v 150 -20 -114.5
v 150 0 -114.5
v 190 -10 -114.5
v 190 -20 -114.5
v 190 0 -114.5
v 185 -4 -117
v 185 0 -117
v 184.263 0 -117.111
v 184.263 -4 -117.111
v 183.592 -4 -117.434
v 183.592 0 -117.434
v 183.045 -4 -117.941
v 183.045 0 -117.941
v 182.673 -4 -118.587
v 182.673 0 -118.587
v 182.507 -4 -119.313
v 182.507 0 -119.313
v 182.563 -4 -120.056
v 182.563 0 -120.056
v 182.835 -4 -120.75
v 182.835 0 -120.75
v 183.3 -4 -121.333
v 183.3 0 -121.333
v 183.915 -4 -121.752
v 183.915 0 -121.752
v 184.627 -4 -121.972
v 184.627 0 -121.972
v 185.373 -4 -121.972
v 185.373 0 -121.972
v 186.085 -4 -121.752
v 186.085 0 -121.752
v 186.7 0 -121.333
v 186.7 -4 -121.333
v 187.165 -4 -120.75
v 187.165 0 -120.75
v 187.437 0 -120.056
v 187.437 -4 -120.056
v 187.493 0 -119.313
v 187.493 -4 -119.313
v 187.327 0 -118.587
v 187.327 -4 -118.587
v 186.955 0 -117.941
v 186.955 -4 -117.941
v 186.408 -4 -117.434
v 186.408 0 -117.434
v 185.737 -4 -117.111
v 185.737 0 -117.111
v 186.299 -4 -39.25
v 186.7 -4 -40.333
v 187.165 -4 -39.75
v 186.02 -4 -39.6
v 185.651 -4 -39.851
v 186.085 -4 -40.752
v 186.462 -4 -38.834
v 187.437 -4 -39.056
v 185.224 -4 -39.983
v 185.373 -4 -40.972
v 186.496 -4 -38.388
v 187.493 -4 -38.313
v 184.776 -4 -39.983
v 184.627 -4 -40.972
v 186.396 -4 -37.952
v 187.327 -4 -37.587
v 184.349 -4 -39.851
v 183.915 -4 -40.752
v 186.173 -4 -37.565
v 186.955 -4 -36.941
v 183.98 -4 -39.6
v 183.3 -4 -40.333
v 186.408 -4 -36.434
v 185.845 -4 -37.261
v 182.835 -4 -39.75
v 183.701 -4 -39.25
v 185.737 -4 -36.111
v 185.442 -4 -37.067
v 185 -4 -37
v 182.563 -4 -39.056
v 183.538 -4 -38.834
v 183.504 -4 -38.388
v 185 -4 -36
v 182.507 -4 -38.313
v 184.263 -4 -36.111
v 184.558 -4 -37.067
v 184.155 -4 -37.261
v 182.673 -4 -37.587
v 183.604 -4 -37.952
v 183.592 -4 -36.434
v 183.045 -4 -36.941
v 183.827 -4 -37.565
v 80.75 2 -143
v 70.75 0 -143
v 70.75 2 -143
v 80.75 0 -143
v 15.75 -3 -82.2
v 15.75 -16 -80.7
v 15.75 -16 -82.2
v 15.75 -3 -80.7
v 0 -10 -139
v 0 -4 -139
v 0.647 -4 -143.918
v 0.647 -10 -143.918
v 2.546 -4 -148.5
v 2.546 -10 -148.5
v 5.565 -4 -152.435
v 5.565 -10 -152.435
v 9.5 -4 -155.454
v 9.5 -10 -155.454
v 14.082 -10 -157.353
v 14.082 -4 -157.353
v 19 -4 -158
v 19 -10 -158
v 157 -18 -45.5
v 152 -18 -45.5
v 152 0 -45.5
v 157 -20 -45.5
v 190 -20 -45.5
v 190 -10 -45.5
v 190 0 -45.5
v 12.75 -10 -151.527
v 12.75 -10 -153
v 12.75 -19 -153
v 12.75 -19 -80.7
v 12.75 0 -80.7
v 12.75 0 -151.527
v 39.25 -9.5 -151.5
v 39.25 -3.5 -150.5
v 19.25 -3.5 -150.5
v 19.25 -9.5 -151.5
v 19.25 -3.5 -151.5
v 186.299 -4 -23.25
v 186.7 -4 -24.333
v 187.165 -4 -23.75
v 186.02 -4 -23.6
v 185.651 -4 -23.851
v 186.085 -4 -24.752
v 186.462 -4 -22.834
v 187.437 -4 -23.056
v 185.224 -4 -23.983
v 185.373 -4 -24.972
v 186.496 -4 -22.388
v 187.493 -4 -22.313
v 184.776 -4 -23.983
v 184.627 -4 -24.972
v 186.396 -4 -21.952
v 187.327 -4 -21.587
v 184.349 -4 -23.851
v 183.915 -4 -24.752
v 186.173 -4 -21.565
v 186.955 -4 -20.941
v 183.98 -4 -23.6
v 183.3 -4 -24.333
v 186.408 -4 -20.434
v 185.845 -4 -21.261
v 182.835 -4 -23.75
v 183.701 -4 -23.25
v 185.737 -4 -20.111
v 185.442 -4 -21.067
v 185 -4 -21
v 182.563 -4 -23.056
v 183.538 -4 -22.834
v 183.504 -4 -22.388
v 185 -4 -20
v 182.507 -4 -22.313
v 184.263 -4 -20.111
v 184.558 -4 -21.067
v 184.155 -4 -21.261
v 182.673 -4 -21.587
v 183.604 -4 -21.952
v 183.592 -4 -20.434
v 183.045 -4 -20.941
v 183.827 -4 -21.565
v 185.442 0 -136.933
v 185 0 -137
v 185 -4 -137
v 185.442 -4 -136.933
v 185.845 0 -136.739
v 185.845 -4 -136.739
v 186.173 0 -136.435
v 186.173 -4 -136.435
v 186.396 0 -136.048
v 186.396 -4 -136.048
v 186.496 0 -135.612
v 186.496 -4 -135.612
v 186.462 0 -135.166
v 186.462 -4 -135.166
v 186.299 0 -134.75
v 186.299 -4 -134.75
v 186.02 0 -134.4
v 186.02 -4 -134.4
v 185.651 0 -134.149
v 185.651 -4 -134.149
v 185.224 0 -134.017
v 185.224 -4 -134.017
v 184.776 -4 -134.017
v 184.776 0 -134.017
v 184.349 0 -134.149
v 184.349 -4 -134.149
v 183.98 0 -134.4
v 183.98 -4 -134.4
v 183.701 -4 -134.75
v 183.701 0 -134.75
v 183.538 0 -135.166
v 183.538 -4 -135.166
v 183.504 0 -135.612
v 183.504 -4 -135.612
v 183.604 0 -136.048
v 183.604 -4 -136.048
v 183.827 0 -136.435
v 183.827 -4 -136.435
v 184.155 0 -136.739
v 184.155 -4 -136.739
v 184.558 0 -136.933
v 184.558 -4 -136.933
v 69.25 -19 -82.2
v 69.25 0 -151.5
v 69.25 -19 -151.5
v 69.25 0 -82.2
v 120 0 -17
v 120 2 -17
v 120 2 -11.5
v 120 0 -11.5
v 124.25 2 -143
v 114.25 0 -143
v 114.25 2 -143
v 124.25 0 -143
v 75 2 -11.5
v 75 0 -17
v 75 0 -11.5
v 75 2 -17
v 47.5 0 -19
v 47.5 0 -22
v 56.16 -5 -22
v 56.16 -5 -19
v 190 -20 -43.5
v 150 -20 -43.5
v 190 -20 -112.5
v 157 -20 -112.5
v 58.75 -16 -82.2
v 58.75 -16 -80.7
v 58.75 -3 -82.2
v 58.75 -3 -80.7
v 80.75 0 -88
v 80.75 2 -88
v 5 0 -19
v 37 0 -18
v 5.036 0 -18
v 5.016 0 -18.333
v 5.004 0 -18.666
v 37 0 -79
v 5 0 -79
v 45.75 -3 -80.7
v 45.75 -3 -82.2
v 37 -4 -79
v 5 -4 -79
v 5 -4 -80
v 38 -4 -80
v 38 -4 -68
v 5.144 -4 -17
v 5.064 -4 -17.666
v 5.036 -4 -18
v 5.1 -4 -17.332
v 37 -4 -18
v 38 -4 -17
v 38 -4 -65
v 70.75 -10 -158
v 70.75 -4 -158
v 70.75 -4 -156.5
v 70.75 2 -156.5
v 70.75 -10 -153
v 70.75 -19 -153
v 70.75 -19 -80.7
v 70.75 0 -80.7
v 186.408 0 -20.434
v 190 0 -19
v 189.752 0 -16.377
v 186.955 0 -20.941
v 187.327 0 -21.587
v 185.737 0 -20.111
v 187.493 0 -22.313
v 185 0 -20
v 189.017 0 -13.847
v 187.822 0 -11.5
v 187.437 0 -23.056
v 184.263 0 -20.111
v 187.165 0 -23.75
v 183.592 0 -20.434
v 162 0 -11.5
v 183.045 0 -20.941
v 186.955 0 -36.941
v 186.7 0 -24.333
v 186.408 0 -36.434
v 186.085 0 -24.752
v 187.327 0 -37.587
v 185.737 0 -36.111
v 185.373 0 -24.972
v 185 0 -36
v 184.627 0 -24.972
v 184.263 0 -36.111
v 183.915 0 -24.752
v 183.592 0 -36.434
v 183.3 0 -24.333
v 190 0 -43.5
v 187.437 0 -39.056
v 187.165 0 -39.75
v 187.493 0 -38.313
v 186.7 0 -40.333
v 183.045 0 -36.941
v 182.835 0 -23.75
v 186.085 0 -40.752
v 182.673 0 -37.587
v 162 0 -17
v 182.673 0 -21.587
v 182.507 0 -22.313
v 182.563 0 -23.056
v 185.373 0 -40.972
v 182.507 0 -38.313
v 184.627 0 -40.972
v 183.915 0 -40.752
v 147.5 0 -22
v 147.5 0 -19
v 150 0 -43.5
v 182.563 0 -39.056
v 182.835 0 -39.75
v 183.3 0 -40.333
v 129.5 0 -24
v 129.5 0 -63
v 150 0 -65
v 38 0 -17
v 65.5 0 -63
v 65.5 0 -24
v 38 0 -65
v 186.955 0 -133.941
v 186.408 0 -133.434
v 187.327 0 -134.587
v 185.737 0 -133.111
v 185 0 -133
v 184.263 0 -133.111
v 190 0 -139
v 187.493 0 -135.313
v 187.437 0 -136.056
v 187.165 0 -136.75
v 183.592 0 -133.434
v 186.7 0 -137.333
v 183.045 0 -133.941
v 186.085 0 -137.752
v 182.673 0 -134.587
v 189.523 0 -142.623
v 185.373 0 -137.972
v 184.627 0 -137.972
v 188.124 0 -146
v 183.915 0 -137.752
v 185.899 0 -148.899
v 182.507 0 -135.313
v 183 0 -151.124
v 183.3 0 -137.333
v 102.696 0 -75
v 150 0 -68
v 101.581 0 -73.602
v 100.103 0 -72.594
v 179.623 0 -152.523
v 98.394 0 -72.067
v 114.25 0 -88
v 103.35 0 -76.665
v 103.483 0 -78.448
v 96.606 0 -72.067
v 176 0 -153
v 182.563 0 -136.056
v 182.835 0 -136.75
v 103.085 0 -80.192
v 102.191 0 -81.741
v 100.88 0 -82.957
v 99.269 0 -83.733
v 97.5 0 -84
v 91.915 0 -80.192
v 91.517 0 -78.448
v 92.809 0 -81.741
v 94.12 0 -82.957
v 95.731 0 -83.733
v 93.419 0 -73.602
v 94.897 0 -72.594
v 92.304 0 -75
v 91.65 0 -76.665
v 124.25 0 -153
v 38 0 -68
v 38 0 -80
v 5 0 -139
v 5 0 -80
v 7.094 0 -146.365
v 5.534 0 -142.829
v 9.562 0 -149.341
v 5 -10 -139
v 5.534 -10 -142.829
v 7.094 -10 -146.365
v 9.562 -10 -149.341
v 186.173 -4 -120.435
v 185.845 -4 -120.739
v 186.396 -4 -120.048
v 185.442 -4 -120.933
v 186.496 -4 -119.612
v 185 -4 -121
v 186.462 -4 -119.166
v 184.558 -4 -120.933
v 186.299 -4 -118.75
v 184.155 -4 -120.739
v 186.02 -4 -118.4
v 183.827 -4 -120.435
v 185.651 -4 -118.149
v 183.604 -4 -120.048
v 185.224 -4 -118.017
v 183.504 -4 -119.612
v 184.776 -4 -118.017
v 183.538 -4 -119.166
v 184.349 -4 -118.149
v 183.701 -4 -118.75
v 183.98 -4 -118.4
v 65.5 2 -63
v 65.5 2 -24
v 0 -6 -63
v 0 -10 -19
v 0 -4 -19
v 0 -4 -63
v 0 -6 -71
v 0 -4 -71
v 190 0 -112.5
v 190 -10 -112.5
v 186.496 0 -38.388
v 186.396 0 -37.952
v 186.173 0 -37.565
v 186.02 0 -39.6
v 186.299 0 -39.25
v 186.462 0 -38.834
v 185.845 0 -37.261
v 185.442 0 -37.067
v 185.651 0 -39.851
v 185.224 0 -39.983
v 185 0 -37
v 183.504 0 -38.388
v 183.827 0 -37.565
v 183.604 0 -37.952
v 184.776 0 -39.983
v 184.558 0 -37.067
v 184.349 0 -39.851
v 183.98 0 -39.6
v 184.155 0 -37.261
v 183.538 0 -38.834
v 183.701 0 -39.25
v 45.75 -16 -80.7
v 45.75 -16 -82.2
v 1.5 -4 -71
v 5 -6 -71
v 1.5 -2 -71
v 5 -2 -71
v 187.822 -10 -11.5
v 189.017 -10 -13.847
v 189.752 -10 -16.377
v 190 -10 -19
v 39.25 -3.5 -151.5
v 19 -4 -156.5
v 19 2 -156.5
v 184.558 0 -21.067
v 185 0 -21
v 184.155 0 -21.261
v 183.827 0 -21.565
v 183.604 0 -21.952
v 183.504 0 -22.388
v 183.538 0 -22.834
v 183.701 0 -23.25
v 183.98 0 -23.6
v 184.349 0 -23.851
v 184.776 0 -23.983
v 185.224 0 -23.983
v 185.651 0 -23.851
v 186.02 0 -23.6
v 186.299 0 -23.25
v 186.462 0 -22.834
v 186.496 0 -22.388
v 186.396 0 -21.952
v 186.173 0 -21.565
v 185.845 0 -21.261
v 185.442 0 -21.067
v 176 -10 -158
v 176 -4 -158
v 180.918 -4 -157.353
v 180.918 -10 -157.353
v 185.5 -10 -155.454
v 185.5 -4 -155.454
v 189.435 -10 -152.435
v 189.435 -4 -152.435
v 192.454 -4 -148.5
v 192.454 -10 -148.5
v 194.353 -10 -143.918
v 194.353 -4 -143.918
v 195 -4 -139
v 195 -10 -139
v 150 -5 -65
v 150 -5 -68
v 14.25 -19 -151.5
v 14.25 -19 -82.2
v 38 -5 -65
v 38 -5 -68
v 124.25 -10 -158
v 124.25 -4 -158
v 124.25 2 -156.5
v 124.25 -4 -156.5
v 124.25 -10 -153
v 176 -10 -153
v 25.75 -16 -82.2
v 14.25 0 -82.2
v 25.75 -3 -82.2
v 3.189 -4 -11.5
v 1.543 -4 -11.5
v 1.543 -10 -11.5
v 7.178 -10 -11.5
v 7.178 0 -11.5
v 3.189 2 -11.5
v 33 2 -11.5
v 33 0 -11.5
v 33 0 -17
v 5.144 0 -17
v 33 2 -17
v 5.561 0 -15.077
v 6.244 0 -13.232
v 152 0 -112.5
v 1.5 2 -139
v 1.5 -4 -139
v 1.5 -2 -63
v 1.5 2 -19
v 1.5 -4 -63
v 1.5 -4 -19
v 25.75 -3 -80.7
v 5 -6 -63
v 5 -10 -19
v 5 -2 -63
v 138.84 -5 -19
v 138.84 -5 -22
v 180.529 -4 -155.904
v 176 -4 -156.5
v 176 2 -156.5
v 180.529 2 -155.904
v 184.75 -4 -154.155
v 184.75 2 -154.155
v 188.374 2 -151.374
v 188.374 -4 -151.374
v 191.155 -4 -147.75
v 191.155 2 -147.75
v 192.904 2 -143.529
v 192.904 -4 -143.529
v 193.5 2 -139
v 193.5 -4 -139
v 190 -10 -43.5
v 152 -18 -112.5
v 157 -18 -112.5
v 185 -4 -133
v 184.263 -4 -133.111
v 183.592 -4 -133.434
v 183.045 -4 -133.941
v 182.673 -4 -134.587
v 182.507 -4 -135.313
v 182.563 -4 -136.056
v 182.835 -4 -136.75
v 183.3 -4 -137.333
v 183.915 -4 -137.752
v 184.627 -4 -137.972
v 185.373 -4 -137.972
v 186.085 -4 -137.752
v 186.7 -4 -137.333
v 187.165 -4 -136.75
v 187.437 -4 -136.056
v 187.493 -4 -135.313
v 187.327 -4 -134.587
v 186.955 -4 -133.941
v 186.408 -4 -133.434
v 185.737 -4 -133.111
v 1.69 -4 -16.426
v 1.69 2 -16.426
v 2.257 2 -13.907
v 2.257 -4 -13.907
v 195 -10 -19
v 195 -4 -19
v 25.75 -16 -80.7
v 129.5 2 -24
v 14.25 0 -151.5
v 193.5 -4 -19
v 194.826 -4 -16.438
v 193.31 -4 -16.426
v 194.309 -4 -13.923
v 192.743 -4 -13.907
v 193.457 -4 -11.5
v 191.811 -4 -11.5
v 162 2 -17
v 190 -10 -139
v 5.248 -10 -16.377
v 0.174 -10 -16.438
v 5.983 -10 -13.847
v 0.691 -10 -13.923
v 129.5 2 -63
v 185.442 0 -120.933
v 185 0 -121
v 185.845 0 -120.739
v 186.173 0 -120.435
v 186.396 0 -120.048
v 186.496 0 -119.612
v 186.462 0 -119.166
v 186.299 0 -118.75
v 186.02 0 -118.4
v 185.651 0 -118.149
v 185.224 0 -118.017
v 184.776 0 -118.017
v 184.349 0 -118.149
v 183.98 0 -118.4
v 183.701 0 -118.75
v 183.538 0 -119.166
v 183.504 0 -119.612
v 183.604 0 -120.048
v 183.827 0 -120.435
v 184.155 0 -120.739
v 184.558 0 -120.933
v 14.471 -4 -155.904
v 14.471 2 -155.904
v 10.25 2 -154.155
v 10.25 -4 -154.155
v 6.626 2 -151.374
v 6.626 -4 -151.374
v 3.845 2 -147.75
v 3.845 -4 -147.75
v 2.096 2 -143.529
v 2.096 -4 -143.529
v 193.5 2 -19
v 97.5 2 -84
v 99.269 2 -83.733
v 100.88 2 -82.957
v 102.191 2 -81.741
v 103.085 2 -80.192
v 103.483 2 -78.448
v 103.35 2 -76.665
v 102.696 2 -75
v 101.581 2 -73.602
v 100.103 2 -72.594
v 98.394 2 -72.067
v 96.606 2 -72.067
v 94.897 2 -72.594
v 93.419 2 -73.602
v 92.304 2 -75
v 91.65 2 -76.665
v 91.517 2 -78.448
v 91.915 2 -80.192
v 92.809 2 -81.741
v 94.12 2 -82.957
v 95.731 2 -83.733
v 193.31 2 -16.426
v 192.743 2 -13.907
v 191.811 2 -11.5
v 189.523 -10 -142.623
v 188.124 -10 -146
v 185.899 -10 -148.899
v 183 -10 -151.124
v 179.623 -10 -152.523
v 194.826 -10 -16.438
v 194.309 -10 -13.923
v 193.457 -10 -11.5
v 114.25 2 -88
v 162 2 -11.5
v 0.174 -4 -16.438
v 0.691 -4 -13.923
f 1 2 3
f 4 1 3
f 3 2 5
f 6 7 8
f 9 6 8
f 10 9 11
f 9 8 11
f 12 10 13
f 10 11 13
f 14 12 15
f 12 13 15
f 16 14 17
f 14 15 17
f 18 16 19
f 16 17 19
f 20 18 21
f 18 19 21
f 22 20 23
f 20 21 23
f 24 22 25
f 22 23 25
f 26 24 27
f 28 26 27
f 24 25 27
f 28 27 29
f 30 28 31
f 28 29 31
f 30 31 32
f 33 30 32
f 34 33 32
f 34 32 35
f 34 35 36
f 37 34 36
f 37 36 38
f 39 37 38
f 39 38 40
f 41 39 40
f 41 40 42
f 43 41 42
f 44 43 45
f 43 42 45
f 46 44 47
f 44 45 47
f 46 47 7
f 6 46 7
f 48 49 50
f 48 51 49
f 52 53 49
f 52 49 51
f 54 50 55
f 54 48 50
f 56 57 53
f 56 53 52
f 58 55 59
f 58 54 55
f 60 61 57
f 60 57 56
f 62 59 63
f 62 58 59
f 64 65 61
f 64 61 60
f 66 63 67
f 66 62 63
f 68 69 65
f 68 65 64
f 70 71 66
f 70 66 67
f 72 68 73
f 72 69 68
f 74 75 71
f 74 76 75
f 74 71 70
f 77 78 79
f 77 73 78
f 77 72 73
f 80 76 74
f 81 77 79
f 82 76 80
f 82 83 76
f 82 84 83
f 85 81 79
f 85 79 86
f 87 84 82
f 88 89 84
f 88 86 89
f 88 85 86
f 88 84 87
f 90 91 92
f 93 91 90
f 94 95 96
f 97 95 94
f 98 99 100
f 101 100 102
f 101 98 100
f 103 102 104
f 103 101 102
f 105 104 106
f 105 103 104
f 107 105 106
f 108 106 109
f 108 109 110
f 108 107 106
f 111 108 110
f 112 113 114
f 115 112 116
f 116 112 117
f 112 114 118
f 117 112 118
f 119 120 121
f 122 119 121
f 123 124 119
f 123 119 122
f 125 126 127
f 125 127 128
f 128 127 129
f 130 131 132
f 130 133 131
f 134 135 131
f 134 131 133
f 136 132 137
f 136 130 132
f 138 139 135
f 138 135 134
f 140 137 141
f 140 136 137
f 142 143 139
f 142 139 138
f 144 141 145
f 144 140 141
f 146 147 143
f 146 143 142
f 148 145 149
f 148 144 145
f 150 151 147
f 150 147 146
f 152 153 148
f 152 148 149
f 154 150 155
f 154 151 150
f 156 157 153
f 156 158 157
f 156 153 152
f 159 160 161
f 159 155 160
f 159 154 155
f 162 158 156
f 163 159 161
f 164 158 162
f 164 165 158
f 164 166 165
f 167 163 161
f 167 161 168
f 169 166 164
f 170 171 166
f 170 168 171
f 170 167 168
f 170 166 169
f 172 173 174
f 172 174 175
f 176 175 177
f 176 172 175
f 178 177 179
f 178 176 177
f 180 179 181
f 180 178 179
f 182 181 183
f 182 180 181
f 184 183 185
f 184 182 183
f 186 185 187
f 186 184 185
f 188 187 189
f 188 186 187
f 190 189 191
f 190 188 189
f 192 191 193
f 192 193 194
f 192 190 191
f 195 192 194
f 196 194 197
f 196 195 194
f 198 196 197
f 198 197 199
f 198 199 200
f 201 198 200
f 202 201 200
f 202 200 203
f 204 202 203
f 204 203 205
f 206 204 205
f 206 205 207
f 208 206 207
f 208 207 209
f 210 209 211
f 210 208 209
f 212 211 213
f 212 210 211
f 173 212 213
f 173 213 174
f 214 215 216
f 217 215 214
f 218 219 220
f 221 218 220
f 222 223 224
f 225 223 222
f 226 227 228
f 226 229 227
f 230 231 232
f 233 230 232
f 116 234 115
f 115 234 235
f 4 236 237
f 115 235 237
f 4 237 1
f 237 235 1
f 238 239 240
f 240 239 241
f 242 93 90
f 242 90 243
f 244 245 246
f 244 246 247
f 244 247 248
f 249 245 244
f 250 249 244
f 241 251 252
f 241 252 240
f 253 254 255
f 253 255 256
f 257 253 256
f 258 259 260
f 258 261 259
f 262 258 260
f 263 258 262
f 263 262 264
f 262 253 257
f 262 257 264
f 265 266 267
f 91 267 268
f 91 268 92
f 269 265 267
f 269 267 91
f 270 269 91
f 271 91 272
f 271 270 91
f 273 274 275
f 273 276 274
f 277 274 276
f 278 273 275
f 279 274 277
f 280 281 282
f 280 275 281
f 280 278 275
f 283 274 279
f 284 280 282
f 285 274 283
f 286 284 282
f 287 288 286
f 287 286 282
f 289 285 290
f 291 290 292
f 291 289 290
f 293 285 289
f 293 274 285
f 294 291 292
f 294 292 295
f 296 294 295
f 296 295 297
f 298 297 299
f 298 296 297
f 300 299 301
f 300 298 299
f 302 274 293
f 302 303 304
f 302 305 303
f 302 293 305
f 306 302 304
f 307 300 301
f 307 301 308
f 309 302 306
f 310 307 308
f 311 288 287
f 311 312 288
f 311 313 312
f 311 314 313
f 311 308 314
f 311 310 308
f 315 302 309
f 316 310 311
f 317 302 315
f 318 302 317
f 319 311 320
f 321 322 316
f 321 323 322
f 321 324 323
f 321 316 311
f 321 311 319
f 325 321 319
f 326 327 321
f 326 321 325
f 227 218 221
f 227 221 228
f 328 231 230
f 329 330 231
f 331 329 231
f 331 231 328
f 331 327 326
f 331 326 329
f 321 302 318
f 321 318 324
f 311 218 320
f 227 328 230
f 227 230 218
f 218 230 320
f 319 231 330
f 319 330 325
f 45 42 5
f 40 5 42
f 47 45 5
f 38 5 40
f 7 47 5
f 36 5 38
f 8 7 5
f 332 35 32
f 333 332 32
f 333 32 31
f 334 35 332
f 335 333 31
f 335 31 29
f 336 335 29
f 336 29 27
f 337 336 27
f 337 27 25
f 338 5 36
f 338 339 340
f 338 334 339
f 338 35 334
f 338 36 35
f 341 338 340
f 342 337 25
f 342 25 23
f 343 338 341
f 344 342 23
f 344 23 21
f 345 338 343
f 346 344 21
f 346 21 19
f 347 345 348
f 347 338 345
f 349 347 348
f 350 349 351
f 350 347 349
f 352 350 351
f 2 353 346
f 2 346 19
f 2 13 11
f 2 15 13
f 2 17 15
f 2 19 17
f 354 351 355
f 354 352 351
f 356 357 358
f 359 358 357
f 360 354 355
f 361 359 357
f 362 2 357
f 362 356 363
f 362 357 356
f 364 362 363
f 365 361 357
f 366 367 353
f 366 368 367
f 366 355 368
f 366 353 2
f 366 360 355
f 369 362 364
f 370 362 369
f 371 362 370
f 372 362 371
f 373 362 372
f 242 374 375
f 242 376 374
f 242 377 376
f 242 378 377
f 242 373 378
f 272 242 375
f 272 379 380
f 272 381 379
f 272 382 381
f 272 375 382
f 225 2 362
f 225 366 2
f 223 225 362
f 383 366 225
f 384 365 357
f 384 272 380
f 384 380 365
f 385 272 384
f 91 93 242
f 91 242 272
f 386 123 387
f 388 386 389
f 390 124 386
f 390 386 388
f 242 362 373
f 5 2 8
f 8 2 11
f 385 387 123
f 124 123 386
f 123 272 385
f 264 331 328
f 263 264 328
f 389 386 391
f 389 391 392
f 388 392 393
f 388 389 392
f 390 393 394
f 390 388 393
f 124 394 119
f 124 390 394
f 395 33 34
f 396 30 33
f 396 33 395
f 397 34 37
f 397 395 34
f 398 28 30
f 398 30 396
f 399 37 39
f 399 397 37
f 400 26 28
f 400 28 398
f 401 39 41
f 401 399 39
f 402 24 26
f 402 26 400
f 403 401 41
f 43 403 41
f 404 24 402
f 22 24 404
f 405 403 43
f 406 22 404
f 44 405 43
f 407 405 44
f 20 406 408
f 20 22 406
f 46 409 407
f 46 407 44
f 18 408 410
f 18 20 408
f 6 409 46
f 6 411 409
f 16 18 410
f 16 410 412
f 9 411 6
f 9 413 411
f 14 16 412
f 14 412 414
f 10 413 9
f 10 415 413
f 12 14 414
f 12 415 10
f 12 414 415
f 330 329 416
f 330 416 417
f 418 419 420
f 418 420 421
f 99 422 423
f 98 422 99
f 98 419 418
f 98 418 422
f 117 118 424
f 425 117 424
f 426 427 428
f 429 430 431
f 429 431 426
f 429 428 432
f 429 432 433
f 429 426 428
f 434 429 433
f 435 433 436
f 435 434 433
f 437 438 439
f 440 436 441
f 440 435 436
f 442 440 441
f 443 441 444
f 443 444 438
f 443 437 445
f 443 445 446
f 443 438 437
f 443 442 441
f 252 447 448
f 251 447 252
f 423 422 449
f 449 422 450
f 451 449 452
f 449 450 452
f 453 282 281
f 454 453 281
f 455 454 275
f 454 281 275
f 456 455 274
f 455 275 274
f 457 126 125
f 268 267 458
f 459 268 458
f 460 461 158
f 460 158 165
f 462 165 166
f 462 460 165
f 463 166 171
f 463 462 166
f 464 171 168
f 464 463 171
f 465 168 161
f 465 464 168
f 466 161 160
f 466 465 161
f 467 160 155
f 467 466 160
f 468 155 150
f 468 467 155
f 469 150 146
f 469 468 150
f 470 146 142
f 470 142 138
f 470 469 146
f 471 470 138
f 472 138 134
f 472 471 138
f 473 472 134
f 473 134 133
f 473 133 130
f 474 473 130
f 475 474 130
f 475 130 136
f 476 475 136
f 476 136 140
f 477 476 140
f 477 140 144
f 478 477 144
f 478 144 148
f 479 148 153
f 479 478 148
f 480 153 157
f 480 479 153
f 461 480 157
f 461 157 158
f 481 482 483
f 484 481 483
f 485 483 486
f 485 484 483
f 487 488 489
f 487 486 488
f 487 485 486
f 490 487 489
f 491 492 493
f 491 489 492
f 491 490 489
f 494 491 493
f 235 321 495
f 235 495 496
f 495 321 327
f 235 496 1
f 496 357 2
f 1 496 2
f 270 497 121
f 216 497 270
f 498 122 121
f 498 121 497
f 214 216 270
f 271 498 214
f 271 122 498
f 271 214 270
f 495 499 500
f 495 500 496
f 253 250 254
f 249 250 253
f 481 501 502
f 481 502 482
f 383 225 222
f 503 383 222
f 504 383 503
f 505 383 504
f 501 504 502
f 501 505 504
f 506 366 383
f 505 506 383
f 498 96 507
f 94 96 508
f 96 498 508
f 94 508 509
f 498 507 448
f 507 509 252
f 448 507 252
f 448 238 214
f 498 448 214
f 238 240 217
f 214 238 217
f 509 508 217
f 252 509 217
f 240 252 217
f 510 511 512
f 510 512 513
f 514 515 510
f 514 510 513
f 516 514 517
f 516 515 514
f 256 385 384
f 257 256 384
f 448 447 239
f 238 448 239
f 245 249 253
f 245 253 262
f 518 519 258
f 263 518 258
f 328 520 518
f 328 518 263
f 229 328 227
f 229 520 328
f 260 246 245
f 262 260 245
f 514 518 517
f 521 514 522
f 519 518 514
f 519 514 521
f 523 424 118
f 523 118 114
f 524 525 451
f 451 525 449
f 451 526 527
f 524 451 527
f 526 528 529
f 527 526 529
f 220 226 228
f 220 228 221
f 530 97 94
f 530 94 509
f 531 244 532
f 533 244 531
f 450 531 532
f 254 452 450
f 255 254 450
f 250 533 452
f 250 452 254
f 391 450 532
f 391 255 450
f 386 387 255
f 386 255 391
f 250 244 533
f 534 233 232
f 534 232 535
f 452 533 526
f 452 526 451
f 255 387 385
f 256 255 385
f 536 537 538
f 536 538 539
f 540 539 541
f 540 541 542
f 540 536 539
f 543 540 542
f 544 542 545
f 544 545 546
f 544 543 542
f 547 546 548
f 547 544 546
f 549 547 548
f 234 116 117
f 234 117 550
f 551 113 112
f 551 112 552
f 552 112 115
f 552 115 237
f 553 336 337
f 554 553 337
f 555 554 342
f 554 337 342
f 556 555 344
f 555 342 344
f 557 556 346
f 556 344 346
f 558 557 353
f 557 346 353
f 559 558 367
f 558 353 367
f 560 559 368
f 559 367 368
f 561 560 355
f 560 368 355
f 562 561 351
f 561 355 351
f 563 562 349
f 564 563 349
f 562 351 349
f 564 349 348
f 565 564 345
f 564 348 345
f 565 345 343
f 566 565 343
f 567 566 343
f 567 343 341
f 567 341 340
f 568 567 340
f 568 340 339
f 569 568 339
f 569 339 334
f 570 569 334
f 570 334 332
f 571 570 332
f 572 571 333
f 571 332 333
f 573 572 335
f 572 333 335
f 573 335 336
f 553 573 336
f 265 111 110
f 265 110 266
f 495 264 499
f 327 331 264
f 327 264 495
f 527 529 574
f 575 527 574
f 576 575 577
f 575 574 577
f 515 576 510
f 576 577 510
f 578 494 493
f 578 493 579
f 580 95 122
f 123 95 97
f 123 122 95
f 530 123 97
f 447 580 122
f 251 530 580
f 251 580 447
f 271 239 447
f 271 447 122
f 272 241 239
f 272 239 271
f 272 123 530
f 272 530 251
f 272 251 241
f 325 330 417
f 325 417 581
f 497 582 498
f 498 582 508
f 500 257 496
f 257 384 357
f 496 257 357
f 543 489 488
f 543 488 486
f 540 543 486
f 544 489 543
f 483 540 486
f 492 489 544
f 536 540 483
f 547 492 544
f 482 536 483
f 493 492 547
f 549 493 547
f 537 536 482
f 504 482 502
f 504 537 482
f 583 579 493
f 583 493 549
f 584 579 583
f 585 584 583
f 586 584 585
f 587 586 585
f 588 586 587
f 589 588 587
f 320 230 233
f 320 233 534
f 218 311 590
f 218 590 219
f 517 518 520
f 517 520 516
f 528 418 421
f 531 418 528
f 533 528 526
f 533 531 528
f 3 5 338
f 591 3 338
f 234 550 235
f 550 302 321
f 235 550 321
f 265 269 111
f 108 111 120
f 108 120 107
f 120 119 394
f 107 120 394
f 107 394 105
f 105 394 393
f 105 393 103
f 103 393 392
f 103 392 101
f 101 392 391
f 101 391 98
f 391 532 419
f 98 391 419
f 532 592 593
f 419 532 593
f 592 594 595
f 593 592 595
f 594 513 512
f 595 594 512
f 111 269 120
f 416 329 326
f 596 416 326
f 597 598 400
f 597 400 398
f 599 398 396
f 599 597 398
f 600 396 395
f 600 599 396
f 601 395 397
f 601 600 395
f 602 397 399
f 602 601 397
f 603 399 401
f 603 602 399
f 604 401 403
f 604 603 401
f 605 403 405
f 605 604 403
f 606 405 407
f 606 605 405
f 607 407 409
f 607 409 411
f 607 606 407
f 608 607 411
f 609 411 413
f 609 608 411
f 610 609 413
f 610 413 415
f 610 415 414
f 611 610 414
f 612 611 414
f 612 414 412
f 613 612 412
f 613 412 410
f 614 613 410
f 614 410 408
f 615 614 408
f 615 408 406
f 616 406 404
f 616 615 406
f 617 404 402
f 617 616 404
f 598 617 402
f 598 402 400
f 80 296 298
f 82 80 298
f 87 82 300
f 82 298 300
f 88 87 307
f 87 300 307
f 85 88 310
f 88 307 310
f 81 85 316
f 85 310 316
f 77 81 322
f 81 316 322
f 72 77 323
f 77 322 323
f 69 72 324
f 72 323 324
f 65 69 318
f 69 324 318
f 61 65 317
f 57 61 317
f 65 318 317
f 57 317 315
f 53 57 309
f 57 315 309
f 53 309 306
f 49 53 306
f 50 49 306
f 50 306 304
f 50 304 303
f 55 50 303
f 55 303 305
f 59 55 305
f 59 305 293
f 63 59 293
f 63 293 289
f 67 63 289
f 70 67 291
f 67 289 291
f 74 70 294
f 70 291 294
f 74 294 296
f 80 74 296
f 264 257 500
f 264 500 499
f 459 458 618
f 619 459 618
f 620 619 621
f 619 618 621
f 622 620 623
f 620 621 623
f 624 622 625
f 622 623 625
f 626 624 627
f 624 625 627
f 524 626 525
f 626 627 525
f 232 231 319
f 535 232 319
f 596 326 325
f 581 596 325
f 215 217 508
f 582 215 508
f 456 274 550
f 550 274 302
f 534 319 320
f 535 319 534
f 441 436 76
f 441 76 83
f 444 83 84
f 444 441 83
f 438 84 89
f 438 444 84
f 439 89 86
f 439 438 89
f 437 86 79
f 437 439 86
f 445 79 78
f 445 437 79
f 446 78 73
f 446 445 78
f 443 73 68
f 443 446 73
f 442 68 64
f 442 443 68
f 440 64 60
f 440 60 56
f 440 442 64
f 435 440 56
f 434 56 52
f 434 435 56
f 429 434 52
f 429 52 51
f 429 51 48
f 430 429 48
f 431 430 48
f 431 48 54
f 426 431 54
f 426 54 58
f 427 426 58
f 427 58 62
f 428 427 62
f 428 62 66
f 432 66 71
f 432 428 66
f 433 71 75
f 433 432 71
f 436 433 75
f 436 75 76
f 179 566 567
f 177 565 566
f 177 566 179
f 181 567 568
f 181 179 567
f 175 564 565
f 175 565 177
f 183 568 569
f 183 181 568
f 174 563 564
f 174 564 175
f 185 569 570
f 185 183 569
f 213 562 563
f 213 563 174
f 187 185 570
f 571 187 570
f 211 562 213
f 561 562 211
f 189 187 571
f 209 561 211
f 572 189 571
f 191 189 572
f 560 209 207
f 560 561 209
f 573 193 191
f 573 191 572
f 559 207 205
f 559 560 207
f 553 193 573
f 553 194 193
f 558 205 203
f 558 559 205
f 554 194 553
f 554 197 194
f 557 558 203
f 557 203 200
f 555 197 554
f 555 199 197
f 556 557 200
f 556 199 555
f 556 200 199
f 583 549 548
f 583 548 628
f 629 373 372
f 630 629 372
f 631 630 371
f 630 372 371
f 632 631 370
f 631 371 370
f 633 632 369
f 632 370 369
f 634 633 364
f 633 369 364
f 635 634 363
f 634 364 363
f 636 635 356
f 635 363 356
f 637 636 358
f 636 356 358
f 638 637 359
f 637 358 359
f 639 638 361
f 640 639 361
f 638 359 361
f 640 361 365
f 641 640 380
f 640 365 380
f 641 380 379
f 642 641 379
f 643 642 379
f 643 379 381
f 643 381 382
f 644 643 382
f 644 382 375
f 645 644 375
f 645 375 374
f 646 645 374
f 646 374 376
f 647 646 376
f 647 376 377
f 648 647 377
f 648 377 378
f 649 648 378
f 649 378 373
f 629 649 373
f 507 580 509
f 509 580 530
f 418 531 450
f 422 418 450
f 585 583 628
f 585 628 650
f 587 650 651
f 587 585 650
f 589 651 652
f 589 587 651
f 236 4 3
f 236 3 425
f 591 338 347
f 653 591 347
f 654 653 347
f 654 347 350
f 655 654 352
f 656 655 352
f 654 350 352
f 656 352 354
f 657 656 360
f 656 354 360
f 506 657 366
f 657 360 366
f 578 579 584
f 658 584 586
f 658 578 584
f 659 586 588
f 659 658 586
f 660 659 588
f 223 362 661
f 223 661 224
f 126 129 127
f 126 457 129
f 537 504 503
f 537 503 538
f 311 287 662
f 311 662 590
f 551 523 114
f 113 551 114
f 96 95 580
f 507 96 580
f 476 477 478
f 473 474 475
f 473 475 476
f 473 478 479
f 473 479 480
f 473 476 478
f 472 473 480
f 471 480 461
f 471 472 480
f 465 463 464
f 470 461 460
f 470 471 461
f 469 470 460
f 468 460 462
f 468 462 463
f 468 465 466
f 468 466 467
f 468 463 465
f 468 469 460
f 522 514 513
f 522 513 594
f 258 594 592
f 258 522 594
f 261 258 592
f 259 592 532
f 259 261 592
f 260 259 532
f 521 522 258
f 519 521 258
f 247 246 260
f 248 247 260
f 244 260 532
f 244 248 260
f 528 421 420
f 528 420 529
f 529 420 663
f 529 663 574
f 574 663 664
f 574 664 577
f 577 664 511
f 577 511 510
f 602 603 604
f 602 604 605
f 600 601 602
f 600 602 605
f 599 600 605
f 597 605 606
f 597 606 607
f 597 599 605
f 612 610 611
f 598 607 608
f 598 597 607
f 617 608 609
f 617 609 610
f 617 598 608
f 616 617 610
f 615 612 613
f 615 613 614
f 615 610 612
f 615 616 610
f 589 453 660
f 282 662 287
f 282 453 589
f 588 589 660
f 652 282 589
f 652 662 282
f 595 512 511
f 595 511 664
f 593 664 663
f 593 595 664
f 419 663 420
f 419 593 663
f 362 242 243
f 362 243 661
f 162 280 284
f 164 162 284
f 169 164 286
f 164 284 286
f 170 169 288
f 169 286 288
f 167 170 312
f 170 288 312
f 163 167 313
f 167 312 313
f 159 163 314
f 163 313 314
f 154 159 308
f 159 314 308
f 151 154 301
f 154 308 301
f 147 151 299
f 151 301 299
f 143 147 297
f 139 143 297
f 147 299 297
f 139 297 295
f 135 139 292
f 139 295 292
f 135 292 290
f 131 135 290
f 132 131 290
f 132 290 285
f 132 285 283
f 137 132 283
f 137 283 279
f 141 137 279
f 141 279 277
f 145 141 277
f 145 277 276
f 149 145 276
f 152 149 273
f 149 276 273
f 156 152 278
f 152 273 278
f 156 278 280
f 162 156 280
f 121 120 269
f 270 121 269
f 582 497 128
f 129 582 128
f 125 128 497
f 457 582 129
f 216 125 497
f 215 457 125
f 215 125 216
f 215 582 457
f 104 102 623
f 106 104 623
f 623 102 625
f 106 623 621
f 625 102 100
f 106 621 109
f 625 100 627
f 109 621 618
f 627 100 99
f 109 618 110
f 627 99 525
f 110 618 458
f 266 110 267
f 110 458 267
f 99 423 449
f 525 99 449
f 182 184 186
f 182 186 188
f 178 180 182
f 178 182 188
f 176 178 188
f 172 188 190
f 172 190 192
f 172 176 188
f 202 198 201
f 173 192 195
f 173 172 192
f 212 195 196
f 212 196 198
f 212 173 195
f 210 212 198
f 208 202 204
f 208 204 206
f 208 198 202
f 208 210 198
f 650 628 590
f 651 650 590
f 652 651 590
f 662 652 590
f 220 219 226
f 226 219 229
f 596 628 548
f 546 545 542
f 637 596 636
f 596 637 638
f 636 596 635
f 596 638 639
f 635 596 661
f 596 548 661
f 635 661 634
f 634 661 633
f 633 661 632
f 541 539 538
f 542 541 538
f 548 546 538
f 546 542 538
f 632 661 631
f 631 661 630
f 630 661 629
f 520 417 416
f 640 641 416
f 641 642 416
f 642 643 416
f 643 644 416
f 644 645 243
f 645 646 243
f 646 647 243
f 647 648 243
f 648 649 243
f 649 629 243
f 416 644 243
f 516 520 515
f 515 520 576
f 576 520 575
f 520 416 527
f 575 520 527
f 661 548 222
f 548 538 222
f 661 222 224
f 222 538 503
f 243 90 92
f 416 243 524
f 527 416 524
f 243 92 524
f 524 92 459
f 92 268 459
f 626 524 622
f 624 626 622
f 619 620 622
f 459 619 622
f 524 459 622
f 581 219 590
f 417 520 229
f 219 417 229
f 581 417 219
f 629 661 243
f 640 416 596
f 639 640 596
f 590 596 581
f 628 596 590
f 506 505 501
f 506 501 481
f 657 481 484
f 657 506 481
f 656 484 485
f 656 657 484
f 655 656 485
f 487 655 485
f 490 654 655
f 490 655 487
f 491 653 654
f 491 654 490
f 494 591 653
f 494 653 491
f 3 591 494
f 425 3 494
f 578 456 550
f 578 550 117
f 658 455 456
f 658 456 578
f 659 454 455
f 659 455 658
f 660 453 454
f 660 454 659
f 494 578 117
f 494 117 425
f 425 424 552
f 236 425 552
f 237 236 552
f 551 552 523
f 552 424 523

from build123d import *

# Parameters (mm, degrees)
BOSS_EXTRUDE1_DEPTH     = 2
SKETCH2_W               = 45
SKETCH2_H               = 5
BOSS_EXTRUDE2_DEPTH     = 10
BOSS_EXTRUDE3_DEPTH     = 20
SKETCH4_W               = 67
SKETCH4_H               = 2
BOSS_EXTRUDE4_DEPTH     = 5
SKETCH5_W               = 58
SKETCH5_H               = 72.3
SKETCH5_W_2             = 55
SKETCH5_H_2             = 69.3
BOSS_EXTRUDE5_DEPTH     = 19
SKETCH6_W               = 13
SKETCH6_H               = 13
SKETCH6_W_2             = 10
CUT_EXTRUDE1_DEPTH      = 1.5
BOSS_EXTRUDE6_DEPTH     = 10
CUT_EXTRUDE2_START      = -6
SKETCH9_W               = 45
SKETCH9_H               = 1.5
CUT_EXTRUDE2_DEPTH      = 7
CUT_EXTRUDE3_DEPTH      = 12
SKETCH11_R              = 2.5
SKETCH11_R_2            = 1.5
BOSS_EXTRUDE7_DEPTH     = 4
SKETCH12_W              = 34
SKETCH12_H              = 63
SKETCH12_W_2            = 32
SKETCH12_H_2            = 61
BOSS_EXTRUDE8_DEPTH     = 4
SKETCH13_W              = 8
SKETCH13_H              = 4
CUT_EXTRUDE4_DEPTH      = 18
SKETCH14_R              = 6
SKETCH14_W              = 64
SKETCH14_H              = 39
CUT_EXTRUDE5_DEPTH      = 21
CUT_EXTRUDE5_DEPTH_BACK = 3
SKETCH15_W              = 100
SKETCH15_H              = 3
SKETCH15_W_2            = 112
BOSS_EXTRUDE9_DEPTH     = 5
CUT_EXTRUDE6_DEPTH      = 5


with BuildPart() as part:
    # Sketch1 → Boss-Extrude1 (new body)
    with BuildSketch(Plane(origin=(0, 0, 0), x_dir=(1, 0, 0), z_dir=(0, 1, 0))):
        with BuildLine():
            Line((124.25, 158), (176, 158))
            ThreePointArc((176, 158), (189.435028843, 152.435028843), (195, 139))
            Line((195, 139), (195, 19))
            ThreePointArc((195, 19), (189.435028843, 5.564971157), (176, 0))
            Line((176, 0), (162, 0))
            Line((162, 0), (162, 17))
            Line((162, 17), (120, 17))
            Line((120, 17), (120, 0))
            Line((120, 0), (75, 0))
            Line((75, 0), (75, 17))
            Line((75, 17), (33, 17))
            Line((33, 17), (33, 0))
            Line((33, 0), (19, 0))
            ThreePointArc((19, 0), (5.564971157, 5.564971157), (0, 19))
            Line((0, 19), (0, 139))
            ThreePointArc((0, 139), (5.564971157, 152.435028843), (19, 158))
            Line((19, 158), (70.75, 158))
            Line((70.75, 158), (70.75, 143))
            Line((70.75, 143), (80.75, 143))
            Line((80.75, 143), (80.75, 88))
            Line((80.75, 88), (114.25, 88))
            Line((114.25, 88), (114.25, 143))
            Line((114.25, 143), (124.25, 143))
            Line((124.25, 143), (124.25, 158))
        make_face()
    extrude(amount=BOSS_EXTRUDE1_DEPTH)

    # Sketch2 → Boss-Extrude2 (add)
    with BuildSketch(Plane.XZ):
        with Locations((97.5, -2.5)):
            Rectangle(SKETCH2_W, SKETCH2_H)
        with BuildLine():
            Line((33, 0), (33, -5))
            Line((33, -5), (19, -5))
            ThreePointArc((19, -5), (9.100505063, -9.100505063), (5, -19))
            Line((5, -19), (5, -139))
            ThreePointArc((5, -139), (9.100505063, -148.899494937), (19, -153))
            Line((19, -153), (70.75, -153))
            Line((70.75, -153), (70.75, -158))
            Line((70.75, -158), (19, -158))
            ThreePointArc((19, -158), (5.564971157, -152.435028843), (0, -139))
            Line((0, -139), (0, -19))
            ThreePointArc((0, -19), (5.564971157, -5.564971157), (19, 0))
            Line((19, 0), (33, 0))
        make_face()
        with BuildLine():
            Line((162, 0), (162, -5))
            Line((162, -5), (176, -5))
            ThreePointArc((176, -5), (185.899494937, -9.100505063), (190, -19))
            Line((190, -19), (190, -139))
            ThreePointArc((190, -139), (185.899494937, -148.899494937), (176, -153))
            Line((176, -153), (124.25, -153))
            Line((124.25, -153), (124.25, -158))
            Line((124.25, -158), (176, -158))
            ThreePointArc((176, -158), (189.435028843, -152.435028843), (195, -139))
            Line((195, -139), (195, -19))
            ThreePointArc((195, -19), (189.435028843, -5.564971157), (176, 0))
            Line((176, 0), (162, 0))
        make_face()
    extrude(amount=BOSS_EXTRUDE2_DEPTH)

    # Sketch3 → Boss-Extrude3 (add)
    with BuildSketch(Plane.XZ):
        Polygon((190, -43.5), (150, -43.5), (150, -114.5), (190, -114.5), (190, -112.5), (152, -112.5), (152, -45.5), (190, -45.5), align=None)
    extrude(amount=BOSS_EXTRUDE3_DEPTH)

    # Sketch4 → Boss-Extrude4 (add)
    with BuildSketch(Plane(origin=(152, 0, 0), x_dir=(0, 0, -1), z_dir=(1, 0, 0))):
        with Locations((79, -19)):
            Rectangle(SKETCH4_W, SKETCH4_H)
    extrude(amount=BOSS_EXTRUDE4_DEPTH)

    # Sketch5 → Boss-Extrude5 (add)
    with BuildSketch(Plane.XZ):
        with Locations((41.75, -116.85)):
            Rectangle(SKETCH5_W, SKETCH5_H)
        with Locations((41.75, -116.85)):
            Rectangle(SKETCH5_W_2, SKETCH5_H_2, mode=Mode.SUBTRACT)
    extrude(amount=BOSS_EXTRUDE5_DEPTH)

    # Sketch6 → Cut-Extrude1 (cut)
    with BuildSketch(Plane.XY.offset(-80.7)):
        with Locations((52.25, -9.5)):
            Rectangle(SKETCH6_W, SKETCH6_H)
        with Locations((20.75, -9.5)):
            Rectangle(SKETCH6_W_2, SKETCH6_H)
    extrude(amount=-CUT_EXTRUDE1_DEPTH, mode=Mode.SUBTRACT)

    # Sketch8 → Boss-Extrude6 (add, symmetric)
    with BuildSketch(Plane(origin=(29.25, 0, 0), x_dir=(0, 0, -1), z_dir=(1, 0, 0))):
        Polygon((151.5, -3.5), (150.5, -3.5), (151.5, -9.5), align=None)
    extrude(amount=BOSS_EXTRUDE6_DEPTH, both=True)

    # Sketch9 → Cut-Extrude2 (cut, through all)
    with BuildSketch(Plane.XZ.offset(10).offset(CUT_EXTRUDE2_START)):
        with BuildLine():
            ThreePointArc((0, -139), (5.564971157, -152.435028843), (19, -158))
            Line((19, -158), (70.75, -158))
            Line((70.75, -158), (70.75, -156.5))
            Line((70.75, -156.5), (19, -156.5))
            ThreePointArc((19, -156.5), (6.625631329, -151.374368671), (1.5, -139))
            Line((1.5, -139), (1.5, -19))
            ThreePointArc((1.5, -19), (6.625631329, -6.625631329), (19, -1.5))
            Line((19, -1.5), (33, -1.5))
            Line((33, -1.5), (33, 0))
            Line((33, 0), (19, 0))
            ThreePointArc((19, 0), (5.564971157, -5.564971157), (0, -19))
            Line((0, -19), (0, -139))
        make_face()
        with BuildLine():
            ThreePointArc((193.5, -19), (188.374368671, -6.625631329), (176, -1.5))
            Line((176, -1.5), (162, -1.5))
            Line((162, -1.5), (162, 0))
            Line((162, 0), (176, 0))
            ThreePointArc((176, 0), (189.435028843, -5.564971157), (195, -19))
            Line((195, -19), (195, -139))
            ThreePointArc((195, -139), (189.435028843, -152.435028843), (176, -158))
            Line((176, -158), (124.25, -158))
            Line((124.25, -158), (124.25, -156.5))
            Line((124.25, -156.5), (176, -156.5))
            ThreePointArc((176, -156.5), (188.374368671, -151.374368671), (193.5, -139))
            Line((193.5, -139), (193.5, -19))
        make_face()
        with Locations((97.5, -0.75)):
            Rectangle(SKETCH9_W, SKETCH9_H)
    extrude(amount=-CUT_EXTRUDE2_DEPTH, mode=Mode.SUBTRACT)

    # Sketch10 → Cut-Extrude3 (cut)
    with BuildSketch(Plane(origin=(0, 2, 0), x_dir=(1, 0, 0), z_dir=(0, 1, 0))):
        with BuildLine():
            Line((176, 0), (19, 0))
            ThreePointArc((19, 0), (8.54772752, 3.133368347), (1.54290975, 11.5))
            Line((1.54290975, 11.5), (193.45709025, 11.5))
            ThreePointArc((193.45709025, 11.5), (186.45227248, 3.133368347), (176, 0))
        make_face()
    extrude(amount=-CUT_EXTRUDE3_DEPTH, mode=Mode.SUBTRACT)

    # Sketch11 → Boss-Extrude7 (add)
    with BuildSketch(Plane.XZ):
        with Locations(Location((185, -119.5, 0), (0, 0, 90))):  # turned: the seam where the file's is
            Circle(SKETCH11_R)
        with Locations(Location((185, -119.5, 0), (0, 0, 270))):  # turned: the seam where the file's is
            Circle(SKETCH11_R_2, mode=Mode.SUBTRACT)
        with Locations(Location((185, -135.5, 0), (0, 0, 90))):  # turned: the seam where the file's is
            Circle(SKETCH11_R)
        with Locations(Location((185, -135.5, 0), (0, 0, 270))):  # turned: the seam where the file's is
            Circle(SKETCH11_R_2, mode=Mode.SUBTRACT)
        with Locations(Location((185, -38.5, 0), (0, 0, 90))):  # turned: the seam where the file's is
            Circle(SKETCH11_R)
        with Locations(Location((185, -38.5, 0), (0, 0, 90))):  # turned: the seam where the file's is
            Circle(SKETCH11_R_2, mode=Mode.SUBTRACT)
        with Locations(Location((185, -22.5, 0), (0, 0, 90))):  # turned: the seam where the file's is
            Circle(SKETCH11_R)
        with Locations(Location((185, -22.5, 0), (0, 0, 90))):  # turned: the seam where the file's is
            Circle(SKETCH11_R_2, mode=Mode.SUBTRACT)
    extrude(amount=BOSS_EXTRUDE7_DEPTH)

    # Sketch12 → Boss-Extrude8 (add)
    with BuildSketch(Plane.XZ):
        with Locations((21, -48.5)):
            Rectangle(SKETCH12_W, SKETCH12_H)
        with Locations((21, -48.5)):
            Rectangle(SKETCH12_W_2, SKETCH12_H_2, mode=Mode.SUBTRACT)
    extrude(amount=BOSS_EXTRUDE8_DEPTH)

    # Sketch13 → Cut-Extrude4 (cut)
    with BuildSketch(Plane(origin=(5, 0, 0), x_dir=(0, 0, -1), z_dir=(1, 0, 0))):
        with Locations((67, -4)):
            Rectangle(SKETCH13_W, SKETCH13_H)
    extrude(amount=-CUT_EXTRUDE4_DEPTH, mode=Mode.SUBTRACT)

    # Sketch14 → Cut-Extrude5 (cut, two sides)
    with BuildSketch(Plane.XZ) as cut_extrude5_sk:
        with Locations(Location((97.5, -78, 0), (0, 0, 270))):  # turned: the seam where the file's is
            Circle(SKETCH14_R)
        with Locations((97.5, -43.5)):
            Rectangle(SKETCH14_W, SKETCH14_H)
    extrude(amount=CUT_EXTRUDE5_DEPTH, mode=Mode.SUBTRACT)
    extrude(cut_extrude5_sk.sketch, amount=-CUT_EXTRUDE5_DEPTH_BACK, mode=Mode.SUBTRACT)

    # Sketch15 → Boss-Extrude9 (add)
    with BuildSketch(Plane.XZ):
        with Locations((97.5, -20.5)):
            Rectangle(SKETCH15_W, SKETCH15_H)
        with Locations((94, -66.5)):
            Rectangle(SKETCH15_W_2, SKETCH15_H)
    extrude(amount=BOSS_EXTRUDE9_DEPTH)

    # Sketch16 → Cut-Extrude6 (cut)
    with BuildSketch(Plane(origin=(0, 0, -22), x_dir=(-1, 0, 0), z_dir=(0, 0, -1))):
        Polygon((-47.5, 0), (-56.160254038, -5), (-47.5, -5), align=None)
        Polygon((-147.5, 0), (-138.839745962, -5), (-147.5, -5), align=None)
    extrude(amount=-CUT_EXTRUDE6_DEPTH, mode=Mode.SUBTRACT)


solid = part.part
